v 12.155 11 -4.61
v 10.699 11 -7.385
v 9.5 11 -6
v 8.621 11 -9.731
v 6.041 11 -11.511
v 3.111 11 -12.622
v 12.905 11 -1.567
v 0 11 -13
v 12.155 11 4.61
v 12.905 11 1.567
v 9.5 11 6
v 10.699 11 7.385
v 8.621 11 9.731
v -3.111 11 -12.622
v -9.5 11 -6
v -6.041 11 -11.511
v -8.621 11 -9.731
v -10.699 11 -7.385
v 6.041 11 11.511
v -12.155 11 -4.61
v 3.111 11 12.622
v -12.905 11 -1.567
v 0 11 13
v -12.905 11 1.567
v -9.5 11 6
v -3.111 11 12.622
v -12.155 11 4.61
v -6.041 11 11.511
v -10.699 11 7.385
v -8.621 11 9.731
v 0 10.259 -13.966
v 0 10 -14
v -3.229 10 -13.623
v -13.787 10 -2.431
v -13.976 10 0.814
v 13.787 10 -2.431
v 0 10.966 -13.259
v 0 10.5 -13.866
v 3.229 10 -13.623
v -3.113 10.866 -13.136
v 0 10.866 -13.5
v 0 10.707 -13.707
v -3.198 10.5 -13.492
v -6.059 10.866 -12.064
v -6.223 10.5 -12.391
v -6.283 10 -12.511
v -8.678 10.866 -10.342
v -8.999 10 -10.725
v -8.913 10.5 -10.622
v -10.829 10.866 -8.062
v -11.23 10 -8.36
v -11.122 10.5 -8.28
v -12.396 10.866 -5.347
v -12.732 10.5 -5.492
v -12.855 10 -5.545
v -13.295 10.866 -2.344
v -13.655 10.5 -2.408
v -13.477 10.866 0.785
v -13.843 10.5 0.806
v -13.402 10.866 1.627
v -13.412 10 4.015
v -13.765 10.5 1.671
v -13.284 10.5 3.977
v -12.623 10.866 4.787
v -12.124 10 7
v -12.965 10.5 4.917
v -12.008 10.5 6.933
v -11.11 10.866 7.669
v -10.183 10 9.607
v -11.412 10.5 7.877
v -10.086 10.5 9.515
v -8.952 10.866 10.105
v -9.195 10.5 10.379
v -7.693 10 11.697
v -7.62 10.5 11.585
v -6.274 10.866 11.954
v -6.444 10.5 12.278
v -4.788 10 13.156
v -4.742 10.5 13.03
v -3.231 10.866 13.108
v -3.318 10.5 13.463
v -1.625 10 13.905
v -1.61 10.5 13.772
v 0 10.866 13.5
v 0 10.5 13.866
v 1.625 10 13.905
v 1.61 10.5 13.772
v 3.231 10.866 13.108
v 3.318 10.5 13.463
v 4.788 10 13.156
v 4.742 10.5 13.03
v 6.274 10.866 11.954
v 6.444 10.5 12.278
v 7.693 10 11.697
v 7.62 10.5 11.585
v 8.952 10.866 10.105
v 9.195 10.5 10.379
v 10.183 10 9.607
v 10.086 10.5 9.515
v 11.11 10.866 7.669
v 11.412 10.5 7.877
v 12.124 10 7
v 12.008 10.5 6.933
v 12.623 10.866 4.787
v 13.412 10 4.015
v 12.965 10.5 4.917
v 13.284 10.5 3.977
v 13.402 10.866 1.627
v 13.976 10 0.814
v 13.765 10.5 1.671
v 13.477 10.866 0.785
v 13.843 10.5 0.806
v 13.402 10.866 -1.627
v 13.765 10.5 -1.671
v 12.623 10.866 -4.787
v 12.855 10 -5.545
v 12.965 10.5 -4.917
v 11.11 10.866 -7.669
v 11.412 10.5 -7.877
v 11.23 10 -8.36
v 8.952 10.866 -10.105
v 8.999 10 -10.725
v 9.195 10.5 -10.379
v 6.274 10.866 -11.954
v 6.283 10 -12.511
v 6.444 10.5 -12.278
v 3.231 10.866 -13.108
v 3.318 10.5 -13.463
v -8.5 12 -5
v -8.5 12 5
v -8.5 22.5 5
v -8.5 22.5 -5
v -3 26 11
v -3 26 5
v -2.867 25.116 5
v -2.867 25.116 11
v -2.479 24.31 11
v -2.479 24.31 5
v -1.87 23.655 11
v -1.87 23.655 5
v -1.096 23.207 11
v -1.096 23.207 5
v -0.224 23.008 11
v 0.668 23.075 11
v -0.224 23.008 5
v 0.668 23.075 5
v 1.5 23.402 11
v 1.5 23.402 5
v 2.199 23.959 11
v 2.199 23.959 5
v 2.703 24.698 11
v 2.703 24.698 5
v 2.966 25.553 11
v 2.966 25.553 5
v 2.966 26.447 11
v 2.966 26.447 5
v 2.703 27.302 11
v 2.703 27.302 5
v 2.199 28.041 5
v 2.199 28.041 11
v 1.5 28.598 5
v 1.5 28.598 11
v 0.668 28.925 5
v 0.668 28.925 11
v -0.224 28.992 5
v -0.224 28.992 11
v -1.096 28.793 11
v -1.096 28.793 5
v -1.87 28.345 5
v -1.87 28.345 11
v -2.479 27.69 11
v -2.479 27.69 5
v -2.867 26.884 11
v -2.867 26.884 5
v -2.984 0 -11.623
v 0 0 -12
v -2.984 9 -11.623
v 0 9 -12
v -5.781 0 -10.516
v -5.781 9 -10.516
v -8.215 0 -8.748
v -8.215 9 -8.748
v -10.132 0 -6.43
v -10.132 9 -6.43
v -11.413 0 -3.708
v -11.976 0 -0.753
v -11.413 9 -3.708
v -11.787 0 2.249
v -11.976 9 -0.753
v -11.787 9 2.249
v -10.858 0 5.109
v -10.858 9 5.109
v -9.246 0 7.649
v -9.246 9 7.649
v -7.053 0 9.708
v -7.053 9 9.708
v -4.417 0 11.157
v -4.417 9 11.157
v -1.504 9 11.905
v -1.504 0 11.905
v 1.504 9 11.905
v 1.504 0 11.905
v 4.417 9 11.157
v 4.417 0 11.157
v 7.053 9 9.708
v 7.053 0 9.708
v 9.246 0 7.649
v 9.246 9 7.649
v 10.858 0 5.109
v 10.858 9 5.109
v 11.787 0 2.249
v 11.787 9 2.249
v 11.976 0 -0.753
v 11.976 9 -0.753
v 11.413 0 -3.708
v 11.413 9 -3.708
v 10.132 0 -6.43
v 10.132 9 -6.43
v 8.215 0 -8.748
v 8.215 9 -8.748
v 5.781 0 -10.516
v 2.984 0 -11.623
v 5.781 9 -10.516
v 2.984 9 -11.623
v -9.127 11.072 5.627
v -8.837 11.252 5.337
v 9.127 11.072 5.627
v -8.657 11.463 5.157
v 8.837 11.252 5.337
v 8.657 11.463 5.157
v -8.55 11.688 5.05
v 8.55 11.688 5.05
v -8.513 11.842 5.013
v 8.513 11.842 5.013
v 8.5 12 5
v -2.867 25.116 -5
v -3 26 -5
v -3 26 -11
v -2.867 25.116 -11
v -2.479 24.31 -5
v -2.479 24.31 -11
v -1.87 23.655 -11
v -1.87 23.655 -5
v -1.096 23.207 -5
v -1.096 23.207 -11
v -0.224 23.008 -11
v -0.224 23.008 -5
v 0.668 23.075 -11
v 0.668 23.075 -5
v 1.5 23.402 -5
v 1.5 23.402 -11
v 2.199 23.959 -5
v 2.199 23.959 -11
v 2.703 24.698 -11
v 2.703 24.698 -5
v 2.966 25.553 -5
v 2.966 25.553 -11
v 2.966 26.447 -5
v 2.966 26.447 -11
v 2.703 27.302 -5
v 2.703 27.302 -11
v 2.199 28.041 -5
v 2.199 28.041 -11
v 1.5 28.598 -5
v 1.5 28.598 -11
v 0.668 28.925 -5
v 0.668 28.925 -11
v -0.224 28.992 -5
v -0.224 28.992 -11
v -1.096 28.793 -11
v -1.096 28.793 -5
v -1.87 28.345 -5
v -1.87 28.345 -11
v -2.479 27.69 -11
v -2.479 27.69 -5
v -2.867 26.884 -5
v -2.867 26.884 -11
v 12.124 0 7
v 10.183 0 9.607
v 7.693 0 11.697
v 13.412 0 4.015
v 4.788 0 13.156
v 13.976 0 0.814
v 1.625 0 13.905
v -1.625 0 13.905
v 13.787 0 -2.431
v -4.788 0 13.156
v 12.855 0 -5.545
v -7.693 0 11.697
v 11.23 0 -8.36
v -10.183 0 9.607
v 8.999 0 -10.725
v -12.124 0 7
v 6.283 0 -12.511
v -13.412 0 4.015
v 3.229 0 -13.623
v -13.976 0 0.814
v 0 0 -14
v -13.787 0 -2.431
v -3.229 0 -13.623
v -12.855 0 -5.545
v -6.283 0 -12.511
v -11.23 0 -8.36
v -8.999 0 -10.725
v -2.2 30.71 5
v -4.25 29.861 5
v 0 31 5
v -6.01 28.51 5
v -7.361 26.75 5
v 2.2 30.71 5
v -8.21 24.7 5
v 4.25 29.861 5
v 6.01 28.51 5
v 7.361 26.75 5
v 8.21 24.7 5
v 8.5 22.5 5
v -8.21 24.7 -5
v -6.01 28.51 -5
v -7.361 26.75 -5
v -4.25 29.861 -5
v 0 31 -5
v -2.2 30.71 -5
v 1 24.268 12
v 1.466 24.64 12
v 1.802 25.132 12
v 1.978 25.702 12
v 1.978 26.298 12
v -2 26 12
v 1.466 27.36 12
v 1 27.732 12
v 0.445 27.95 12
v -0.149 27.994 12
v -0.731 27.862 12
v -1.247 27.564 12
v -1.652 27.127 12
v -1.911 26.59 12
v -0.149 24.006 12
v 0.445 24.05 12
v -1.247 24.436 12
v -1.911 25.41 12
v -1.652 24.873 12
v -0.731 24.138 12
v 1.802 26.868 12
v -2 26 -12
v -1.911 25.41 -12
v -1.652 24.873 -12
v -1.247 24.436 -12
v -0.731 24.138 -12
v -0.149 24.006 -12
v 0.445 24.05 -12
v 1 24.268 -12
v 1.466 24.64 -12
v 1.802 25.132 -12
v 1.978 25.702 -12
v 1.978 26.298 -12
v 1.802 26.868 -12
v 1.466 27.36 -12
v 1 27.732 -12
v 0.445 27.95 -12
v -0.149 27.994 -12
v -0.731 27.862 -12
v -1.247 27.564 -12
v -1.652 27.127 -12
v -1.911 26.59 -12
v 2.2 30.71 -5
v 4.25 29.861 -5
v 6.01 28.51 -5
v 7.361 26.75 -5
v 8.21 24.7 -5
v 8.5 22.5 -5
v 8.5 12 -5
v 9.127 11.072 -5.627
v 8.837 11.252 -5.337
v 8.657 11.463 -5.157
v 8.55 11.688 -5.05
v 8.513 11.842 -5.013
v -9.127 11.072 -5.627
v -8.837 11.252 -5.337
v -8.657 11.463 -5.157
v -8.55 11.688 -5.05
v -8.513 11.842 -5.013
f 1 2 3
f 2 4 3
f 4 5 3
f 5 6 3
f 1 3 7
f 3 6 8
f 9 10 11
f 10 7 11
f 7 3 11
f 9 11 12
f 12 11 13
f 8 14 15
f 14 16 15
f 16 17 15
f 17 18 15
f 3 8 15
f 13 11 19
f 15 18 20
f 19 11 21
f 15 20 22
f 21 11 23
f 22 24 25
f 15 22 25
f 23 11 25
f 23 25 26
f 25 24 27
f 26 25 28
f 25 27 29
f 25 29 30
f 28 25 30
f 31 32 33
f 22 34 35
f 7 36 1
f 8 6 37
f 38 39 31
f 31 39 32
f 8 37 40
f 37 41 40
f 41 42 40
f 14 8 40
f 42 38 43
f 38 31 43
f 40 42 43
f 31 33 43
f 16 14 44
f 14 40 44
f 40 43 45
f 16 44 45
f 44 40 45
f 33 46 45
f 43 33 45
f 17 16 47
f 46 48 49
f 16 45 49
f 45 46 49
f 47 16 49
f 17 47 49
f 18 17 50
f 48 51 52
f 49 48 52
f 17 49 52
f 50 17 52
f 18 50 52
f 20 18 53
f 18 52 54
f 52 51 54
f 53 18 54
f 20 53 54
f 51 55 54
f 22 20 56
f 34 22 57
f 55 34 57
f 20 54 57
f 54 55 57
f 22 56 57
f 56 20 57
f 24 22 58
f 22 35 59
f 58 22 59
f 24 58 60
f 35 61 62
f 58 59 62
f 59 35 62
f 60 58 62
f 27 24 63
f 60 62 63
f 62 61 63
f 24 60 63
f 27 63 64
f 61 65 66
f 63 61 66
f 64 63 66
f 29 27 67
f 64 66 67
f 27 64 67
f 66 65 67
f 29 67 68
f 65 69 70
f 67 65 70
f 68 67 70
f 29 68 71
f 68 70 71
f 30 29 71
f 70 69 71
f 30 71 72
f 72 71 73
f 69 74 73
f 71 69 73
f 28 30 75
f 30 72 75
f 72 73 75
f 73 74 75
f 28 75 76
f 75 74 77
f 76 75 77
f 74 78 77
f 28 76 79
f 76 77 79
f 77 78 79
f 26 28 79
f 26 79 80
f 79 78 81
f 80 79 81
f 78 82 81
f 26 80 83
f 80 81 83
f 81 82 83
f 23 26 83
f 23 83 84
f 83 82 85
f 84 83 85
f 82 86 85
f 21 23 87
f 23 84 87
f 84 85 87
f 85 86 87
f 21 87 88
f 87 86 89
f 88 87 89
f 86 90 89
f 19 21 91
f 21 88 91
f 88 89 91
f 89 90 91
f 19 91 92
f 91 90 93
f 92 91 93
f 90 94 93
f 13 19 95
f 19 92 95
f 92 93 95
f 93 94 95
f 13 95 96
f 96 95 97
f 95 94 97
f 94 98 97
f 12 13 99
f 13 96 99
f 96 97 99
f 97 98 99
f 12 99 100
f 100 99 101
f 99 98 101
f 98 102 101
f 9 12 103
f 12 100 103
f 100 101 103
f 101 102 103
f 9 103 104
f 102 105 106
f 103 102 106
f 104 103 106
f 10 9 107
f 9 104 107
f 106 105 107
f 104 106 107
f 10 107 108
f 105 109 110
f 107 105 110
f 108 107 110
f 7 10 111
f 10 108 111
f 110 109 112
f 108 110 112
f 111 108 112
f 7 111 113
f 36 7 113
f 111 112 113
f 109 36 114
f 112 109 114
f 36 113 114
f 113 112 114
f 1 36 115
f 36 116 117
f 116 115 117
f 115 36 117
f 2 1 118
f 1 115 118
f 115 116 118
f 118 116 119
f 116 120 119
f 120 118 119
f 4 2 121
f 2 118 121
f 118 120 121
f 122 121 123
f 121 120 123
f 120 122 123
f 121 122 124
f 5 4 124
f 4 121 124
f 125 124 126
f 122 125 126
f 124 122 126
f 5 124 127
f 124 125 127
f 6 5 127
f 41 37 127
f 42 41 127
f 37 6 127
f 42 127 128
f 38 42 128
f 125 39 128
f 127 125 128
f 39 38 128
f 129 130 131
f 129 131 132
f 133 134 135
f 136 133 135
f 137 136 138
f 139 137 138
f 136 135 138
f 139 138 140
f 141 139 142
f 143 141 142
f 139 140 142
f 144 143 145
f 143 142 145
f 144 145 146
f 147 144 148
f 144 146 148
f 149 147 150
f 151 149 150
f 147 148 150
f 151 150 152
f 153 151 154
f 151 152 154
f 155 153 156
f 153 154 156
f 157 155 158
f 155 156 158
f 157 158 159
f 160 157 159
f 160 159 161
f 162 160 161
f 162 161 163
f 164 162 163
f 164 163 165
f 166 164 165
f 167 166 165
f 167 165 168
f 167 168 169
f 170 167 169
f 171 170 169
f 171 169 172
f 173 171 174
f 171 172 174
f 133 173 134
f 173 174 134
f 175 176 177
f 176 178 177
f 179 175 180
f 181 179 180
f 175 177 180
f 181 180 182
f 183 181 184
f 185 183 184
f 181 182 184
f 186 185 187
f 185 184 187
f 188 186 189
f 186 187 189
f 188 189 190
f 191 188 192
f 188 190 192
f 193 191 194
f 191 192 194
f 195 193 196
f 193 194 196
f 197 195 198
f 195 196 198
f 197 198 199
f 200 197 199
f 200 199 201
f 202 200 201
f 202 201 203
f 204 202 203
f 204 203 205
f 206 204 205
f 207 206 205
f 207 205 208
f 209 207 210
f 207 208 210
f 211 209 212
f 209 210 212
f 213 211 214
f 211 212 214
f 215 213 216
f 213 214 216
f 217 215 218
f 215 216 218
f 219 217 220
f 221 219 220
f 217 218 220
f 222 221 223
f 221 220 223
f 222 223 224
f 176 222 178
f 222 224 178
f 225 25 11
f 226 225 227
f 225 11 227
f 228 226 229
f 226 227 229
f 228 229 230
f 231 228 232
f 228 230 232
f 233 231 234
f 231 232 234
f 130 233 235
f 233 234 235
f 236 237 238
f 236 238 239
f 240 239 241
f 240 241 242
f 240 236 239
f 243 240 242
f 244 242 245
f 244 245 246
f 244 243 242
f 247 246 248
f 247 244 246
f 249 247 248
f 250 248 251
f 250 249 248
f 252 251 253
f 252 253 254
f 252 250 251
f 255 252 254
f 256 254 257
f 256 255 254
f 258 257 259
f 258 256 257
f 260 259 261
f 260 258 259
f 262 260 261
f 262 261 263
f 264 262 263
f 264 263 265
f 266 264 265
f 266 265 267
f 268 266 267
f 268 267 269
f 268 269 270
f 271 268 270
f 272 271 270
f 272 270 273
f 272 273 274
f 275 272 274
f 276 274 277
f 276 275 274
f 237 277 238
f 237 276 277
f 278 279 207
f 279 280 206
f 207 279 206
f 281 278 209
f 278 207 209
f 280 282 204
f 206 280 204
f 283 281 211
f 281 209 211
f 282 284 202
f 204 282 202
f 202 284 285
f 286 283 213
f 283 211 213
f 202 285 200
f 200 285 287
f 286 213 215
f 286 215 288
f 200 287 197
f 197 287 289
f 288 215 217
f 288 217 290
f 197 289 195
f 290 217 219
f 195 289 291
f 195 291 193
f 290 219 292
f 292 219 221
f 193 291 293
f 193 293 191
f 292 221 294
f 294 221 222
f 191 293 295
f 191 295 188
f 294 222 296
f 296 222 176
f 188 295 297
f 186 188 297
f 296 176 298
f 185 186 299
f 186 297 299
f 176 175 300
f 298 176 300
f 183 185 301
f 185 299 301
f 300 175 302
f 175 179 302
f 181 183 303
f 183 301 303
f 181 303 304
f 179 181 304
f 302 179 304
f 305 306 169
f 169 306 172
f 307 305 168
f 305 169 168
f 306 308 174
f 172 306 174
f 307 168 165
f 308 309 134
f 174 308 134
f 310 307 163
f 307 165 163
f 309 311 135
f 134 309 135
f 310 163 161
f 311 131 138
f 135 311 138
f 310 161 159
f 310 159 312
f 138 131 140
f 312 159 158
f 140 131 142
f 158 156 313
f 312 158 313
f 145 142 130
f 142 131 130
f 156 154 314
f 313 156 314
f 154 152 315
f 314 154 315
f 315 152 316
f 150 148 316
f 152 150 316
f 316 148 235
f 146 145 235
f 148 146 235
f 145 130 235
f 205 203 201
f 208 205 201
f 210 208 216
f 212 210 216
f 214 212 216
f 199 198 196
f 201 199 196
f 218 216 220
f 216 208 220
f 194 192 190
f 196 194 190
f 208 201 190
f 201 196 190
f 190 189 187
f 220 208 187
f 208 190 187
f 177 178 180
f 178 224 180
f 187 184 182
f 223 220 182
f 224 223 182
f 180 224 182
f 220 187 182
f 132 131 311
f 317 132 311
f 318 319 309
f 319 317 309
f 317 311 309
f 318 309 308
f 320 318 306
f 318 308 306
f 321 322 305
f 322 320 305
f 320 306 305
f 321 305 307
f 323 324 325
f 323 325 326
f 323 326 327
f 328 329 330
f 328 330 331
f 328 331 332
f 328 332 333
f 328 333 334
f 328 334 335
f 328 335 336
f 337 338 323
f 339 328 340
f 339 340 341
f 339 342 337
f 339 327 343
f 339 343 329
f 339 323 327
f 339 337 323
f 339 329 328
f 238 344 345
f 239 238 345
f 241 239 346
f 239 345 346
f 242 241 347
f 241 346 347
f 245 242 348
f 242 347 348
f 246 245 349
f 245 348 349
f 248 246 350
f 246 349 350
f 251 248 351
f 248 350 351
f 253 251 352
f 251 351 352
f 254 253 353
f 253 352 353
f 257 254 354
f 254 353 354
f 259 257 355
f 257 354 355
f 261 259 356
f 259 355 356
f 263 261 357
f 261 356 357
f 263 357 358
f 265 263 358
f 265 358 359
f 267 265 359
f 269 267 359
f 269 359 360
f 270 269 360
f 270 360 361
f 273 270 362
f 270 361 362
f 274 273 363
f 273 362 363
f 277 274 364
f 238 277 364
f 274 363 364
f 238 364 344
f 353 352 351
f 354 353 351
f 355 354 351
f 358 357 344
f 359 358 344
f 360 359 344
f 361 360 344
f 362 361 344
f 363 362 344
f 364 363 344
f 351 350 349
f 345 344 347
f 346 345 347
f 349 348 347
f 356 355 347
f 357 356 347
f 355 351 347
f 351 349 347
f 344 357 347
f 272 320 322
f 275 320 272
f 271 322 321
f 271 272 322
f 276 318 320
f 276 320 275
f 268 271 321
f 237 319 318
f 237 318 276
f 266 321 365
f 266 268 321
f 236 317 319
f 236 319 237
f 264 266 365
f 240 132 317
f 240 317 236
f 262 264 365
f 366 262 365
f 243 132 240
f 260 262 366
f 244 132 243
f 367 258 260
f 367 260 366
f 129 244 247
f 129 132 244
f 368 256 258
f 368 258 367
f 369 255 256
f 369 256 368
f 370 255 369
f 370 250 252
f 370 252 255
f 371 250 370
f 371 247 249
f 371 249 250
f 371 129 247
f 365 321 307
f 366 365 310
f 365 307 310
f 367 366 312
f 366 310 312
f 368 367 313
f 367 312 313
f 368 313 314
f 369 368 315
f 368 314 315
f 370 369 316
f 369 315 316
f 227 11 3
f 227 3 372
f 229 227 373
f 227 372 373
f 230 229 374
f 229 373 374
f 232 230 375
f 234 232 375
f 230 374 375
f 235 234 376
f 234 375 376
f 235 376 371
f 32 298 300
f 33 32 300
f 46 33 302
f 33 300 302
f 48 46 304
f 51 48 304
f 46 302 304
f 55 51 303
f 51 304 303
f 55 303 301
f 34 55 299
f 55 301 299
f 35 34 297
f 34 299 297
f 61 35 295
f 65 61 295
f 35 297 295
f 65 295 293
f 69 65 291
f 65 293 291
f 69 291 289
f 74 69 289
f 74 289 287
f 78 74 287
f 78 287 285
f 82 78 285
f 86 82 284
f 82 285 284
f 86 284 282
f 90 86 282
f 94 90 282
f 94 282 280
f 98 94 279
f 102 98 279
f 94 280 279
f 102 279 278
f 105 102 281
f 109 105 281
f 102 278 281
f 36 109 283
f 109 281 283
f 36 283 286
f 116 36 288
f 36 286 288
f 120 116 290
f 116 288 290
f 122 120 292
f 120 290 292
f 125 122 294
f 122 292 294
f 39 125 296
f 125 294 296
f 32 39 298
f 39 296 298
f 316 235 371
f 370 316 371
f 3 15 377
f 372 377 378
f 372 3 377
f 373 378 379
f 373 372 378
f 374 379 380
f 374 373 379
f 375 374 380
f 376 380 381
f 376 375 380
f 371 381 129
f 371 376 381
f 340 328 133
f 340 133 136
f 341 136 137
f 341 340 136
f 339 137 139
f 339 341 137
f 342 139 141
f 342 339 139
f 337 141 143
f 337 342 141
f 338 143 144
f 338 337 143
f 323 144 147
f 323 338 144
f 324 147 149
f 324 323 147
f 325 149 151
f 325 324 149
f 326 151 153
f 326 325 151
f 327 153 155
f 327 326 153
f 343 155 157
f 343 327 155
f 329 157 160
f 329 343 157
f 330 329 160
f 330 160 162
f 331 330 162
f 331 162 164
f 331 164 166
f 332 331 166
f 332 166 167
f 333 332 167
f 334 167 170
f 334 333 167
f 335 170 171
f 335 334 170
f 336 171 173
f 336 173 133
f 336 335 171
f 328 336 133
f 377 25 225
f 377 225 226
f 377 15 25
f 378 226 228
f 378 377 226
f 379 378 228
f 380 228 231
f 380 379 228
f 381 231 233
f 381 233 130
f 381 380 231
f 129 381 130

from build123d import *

# Parameters (mm, degrees)
CONG_1_R                = 1
ESQUISSE2_W             = 17
ESQUISSE2_H             = 10
BOSS_EXTRU_1_DEPTH      = 20
CONG_2_R                = 1
ENL_V_MAT_EXTRU_1_REACH = 40.962
ESQUISSE5_R             = 3
BOSS_EXTRU_2_DEPTH      = 7
CHANFREIN1_SIZE         = 1
CHANFREIN2_SIZE         = 1


with BuildPart() as part:
    # Esquisse1 → Révolution1 (revolve)
    with BuildSketch(Plane.XY, mode=Mode.PRIVATE) as r_volution1_sk:
        Polygon((-12, 0), (-12, 9), (0, 9), (0, 11), (-14, 11), (-14, 0), align=None)
    revolve(r_volution1_sk.sketch.rotate(Axis((0, 0, 0), (0, 1, 0)), 270), axis=Axis((0, 0, 0), (0, 1, 0)))

    # Congé1
    cong_1_edges = [part.edges().sort_by_distance(p)[0] for p in [
        (0, 11, 14),
    ]]
    fillet(cong_1_edges, radius=CONG_1_R)

    # Esquisse2 → Boss.-Extru.1 (add)
    with BuildSketch(Plane(origin=(0, 11, 0), x_dir=(1, 0, 0), z_dir=(0, 1, 0))):
        Rectangle(ESQUISSE2_W, ESQUISSE2_H)
    extrude(amount=BOSS_EXTRU_1_DEPTH)

    # Congé2
    cong_2_edges = [part.edges().sort_by_distance(p)[0] for p in [
        (8.5, 11, 0),
        (0, 11, -5),
        (-8.5, 11, 0),
        (0, 11, 5),
    ]]
    fillet(cong_2_edges, radius=CONG_2_R)

    # Esquisse3 → Enlèv. mat.-Extru.1 (cut, up to next)
    with BuildSketch(Plane.XY.offset(5), mode=Mode.PRIVATE) as enl_v_mat_extru_1_sk1:
        with BuildLine():
            ThreePointArc((-8.5, 22.5), (-6.010407626, 28.510407654), (4e-08, 31))
            Line((4e-08, 31), (-8.5, 31))
            Line((-8.5, 31), (-8.5, 22.5))
        make_face()
    enl_v_mat_extru_1_tool1 = extrude(enl_v_mat_extru_1_sk1.sketch, amount=-ENL_V_MAT_EXTRU_1_REACH, mode=Mode.PRIVATE) & part.part
    # Esquisse3 → Enlèv. mat.-Extru.1 (cut, up to next)
    with BuildSketch(Plane.XY.offset(5), mode=Mode.PRIVATE) as enl_v_mat_extru_1_sk2:
        with BuildLine():
            ThreePointArc((4e-08, 31), (6.010407654, 28.510407626), (8.5, 22.5))
            Line((8.5, 22.5), (8.5, 31))
            Line((8.5, 31), (4e-08, 31))
        make_face()
    enl_v_mat_extru_1_tool2 = extrude(enl_v_mat_extru_1_sk2.sketch, amount=-ENL_V_MAT_EXTRU_1_REACH, mode=Mode.PRIVATE) & part.part
    add(enl_v_mat_extru_1_tool1.solids().sort_by_distance((-6.601373, 29.101373, 5))[0], mode=Mode.SUBTRACT)
    add(enl_v_mat_extru_1_tool2.solids().sort_by_distance((6.601373, 29.101373, 5))[0], mode=Mode.SUBTRACT)

    # Esquisse5 → Boss.-Extru.2 (add)
    with BuildSketch(Plane.XY.offset(5)):
        with Locations(Location((0, 26, 0), (0, 0, 180))):
            Circle(ESQUISSE5_R)
    boss_extru_2 = extrude(amount=BOSS_EXTRU_2_DEPTH)

    # Chanfrein1
    chanfrein1_edges = [part.edges().sort_by_distance(p)[0] for p in [
        (3, 26, 12),
    ]]
    chamfer(chanfrein1_edges, length=CHANFREIN1_SIZE)

    # Symétrie4: Boss.-Extru.2 across plane
    add(boss_extru_2.mirror(Plane.XY))

    # Chanfrein2
    chanfrein2_edges = [part.edges().sort_by_distance(p)[0] for p in [
        (3, 26, -12),
    ]]
    chamfer(chanfrein2_edges, length=CHANFREIN2_SIZE)


solid = part.part
